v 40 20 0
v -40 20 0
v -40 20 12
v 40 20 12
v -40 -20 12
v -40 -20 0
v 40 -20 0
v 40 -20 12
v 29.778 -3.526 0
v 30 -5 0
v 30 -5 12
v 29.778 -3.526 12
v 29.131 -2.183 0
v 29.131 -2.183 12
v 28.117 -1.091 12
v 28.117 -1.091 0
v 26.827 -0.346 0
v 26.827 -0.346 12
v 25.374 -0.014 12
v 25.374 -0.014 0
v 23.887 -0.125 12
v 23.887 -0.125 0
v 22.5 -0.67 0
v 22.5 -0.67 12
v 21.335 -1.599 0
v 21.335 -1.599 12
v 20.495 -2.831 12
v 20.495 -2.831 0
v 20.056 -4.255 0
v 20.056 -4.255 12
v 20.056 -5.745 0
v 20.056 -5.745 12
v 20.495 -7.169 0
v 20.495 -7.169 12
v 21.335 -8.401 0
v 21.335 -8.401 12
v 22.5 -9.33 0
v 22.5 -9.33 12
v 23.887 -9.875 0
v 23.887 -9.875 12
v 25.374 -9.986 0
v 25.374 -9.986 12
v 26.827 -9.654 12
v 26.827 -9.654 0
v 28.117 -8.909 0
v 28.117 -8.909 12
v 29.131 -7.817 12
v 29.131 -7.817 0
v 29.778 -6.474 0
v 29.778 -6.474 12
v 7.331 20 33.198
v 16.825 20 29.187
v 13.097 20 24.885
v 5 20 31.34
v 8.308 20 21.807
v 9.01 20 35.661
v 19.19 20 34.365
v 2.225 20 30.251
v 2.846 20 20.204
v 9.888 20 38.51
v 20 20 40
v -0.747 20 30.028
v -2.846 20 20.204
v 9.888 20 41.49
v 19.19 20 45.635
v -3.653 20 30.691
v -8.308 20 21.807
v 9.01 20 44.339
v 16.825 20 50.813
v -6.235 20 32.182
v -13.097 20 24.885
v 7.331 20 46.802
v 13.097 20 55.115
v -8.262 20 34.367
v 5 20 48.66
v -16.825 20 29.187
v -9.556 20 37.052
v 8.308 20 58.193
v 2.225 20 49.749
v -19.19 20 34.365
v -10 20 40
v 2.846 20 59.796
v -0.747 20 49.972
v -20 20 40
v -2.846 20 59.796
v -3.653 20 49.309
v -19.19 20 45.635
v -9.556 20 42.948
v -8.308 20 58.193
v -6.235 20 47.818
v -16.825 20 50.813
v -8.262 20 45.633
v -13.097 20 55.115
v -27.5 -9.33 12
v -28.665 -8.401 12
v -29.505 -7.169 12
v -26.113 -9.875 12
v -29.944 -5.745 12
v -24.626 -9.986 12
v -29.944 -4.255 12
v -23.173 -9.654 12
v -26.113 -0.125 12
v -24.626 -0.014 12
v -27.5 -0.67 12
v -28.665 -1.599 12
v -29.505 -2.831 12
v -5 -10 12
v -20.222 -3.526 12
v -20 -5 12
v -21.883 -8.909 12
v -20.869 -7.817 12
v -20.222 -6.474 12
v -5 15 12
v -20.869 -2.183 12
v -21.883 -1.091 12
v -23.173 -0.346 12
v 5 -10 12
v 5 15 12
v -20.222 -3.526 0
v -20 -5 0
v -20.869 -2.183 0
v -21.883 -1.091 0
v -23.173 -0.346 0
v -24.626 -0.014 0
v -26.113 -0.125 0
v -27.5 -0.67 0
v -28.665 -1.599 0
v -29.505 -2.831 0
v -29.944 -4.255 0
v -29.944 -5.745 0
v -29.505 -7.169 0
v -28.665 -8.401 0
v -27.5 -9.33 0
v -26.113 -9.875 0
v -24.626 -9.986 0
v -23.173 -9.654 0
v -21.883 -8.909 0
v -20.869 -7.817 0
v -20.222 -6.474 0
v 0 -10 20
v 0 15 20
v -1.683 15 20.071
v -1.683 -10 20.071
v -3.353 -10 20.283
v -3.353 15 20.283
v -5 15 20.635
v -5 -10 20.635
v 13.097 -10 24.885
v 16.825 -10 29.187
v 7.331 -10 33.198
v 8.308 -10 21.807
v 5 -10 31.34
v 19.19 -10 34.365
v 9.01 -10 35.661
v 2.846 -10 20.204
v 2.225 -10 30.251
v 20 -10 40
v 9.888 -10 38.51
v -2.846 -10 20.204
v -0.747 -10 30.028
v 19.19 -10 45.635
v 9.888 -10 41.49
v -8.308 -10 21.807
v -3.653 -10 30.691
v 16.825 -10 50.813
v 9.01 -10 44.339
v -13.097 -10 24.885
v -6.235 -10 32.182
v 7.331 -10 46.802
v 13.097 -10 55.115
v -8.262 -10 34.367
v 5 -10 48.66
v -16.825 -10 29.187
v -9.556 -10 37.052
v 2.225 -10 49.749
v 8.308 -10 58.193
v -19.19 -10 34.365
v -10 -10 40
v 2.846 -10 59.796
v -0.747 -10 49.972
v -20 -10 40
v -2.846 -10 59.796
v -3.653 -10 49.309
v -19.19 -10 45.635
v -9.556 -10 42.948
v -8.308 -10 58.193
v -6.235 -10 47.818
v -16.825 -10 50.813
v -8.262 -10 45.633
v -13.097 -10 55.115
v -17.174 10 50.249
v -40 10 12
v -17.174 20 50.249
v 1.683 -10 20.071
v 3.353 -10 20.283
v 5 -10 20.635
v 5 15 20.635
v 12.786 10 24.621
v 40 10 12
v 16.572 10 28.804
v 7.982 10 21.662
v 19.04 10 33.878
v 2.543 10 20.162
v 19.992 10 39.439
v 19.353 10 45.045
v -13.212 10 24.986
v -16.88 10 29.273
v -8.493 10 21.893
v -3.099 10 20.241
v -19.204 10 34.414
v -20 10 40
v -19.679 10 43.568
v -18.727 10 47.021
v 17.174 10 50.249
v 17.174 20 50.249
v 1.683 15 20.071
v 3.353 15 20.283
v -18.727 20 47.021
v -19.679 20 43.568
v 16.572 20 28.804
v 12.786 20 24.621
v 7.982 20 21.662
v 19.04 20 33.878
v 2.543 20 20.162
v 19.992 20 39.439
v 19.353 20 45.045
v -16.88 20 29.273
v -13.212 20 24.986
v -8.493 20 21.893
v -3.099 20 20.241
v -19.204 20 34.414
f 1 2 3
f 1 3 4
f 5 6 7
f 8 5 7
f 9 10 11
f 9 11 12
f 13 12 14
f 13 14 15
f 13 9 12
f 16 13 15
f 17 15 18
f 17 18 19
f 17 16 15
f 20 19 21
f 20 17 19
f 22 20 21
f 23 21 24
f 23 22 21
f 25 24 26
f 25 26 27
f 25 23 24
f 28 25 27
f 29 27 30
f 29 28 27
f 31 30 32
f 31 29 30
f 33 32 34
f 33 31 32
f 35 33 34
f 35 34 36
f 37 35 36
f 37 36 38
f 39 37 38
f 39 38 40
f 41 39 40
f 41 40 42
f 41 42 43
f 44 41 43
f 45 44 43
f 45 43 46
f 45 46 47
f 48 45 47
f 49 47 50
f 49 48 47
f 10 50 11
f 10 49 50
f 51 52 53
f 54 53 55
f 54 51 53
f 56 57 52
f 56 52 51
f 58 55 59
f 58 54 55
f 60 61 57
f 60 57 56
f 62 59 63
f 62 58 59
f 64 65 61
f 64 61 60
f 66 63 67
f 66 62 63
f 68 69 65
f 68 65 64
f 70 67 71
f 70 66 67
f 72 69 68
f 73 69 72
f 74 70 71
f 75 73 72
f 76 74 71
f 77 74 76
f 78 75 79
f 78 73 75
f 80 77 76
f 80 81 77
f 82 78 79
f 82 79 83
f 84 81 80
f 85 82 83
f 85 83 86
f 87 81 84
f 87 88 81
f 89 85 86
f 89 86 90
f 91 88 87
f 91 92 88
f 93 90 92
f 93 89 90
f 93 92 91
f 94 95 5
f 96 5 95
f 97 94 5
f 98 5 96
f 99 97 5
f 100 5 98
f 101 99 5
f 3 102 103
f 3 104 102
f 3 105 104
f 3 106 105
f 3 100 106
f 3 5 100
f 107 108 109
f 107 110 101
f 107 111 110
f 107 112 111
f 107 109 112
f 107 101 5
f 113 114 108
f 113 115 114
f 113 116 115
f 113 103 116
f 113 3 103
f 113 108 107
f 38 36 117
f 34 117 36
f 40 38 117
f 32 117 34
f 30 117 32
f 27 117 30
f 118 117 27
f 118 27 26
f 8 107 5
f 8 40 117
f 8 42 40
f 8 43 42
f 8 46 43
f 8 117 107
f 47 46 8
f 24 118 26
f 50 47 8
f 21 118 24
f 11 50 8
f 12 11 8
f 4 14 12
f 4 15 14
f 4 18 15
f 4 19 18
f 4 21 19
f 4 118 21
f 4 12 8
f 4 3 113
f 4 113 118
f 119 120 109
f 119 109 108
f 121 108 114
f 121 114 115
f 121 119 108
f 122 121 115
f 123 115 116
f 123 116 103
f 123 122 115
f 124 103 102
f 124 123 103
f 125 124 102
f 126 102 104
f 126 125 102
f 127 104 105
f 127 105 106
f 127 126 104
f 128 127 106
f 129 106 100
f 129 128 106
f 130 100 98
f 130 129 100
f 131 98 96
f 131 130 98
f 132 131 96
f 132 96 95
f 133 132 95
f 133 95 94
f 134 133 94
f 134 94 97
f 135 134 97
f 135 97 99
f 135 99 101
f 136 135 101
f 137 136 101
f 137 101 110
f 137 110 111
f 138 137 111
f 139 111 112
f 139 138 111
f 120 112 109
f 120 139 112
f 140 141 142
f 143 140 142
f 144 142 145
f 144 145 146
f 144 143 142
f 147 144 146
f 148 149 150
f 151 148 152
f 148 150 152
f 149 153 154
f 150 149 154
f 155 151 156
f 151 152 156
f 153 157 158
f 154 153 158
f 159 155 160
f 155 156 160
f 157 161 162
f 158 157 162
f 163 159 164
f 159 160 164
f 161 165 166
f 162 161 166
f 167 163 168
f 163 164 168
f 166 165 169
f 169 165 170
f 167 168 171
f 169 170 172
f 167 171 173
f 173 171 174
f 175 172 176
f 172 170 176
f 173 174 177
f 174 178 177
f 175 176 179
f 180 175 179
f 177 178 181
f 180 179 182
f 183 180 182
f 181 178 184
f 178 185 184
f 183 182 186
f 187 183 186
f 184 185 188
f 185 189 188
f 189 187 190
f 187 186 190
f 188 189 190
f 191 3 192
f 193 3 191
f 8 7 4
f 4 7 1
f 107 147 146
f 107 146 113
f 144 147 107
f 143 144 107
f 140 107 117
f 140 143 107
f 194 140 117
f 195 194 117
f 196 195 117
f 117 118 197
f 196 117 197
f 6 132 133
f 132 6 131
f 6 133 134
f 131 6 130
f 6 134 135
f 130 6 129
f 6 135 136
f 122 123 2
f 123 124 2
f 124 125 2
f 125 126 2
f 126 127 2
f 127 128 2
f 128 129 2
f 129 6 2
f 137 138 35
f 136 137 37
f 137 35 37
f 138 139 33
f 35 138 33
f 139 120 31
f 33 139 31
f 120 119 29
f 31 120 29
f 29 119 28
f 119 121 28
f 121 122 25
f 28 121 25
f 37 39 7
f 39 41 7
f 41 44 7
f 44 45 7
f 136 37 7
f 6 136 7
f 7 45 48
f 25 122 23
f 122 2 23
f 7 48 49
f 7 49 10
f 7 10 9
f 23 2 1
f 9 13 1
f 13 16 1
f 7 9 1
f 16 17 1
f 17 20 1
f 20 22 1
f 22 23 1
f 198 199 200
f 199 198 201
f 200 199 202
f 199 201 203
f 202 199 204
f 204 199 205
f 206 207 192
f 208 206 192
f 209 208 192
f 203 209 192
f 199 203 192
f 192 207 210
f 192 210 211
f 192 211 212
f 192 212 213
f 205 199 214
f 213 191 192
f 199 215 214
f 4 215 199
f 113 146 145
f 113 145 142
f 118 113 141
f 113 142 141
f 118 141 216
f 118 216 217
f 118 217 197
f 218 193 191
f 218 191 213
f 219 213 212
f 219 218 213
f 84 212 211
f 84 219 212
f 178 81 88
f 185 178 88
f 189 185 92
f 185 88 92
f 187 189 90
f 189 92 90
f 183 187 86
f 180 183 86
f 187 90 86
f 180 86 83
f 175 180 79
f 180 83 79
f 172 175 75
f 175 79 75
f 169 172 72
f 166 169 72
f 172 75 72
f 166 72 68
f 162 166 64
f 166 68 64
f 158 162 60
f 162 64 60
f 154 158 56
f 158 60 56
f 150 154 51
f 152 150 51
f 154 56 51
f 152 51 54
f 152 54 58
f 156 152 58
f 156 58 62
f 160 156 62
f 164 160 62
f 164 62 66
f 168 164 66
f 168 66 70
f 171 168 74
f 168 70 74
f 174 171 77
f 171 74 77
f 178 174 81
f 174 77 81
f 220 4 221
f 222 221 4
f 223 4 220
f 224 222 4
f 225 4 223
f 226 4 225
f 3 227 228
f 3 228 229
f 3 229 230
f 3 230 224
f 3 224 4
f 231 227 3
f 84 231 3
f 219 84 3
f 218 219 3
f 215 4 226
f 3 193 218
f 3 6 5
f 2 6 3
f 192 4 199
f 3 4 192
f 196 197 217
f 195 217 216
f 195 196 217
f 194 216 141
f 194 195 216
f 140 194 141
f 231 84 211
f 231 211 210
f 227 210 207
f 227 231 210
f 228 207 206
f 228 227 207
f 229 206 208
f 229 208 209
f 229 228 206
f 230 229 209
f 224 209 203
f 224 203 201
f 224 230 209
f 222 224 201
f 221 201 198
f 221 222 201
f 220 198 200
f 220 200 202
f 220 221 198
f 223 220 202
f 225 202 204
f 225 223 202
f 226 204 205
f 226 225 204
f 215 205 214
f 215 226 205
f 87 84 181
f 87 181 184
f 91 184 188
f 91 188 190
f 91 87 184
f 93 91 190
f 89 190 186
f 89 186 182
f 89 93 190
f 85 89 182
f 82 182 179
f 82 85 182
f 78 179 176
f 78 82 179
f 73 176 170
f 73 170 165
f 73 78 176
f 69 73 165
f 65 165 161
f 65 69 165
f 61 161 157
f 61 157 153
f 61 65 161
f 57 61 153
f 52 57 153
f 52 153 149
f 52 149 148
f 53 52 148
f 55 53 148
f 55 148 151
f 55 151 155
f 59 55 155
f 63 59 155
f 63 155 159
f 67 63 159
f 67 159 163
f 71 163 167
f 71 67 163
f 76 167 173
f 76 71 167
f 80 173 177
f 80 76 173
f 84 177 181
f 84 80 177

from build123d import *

# Parameters (mm, degrees)
F0_W     = 80
F0_H     = 40
F0_R     = 5
F1_DEPTH = 12
F2_R     = 20
F2_R_2   = 10
F3_DEPTH = 30
F5_DEPTH = 10
F7_DEPTH = 25


with BuildPart() as f1:
    # F0 (on Top) → F1 (new body)
    with BuildSketch(Plane.XY):
        Rectangle(F0_W, F0_H)
        with Locations((-25, -5)):
            Circle(F0_R, mode=Mode.SUBTRACT)
        with Locations((25, -5)):
            Circle(F0_R, mode=Mode.SUBTRACT)
    extrude(amount=F1_DEPTH)

    # F6 (on face) → F7 (join)
    with BuildSketch(Plane.XZ.offset(10)):
        with BuildLine():
            Line((0, 12), (5, 12))
            Line((5, 12), (5, 20.635083269))
            ThreePointArc((5, 20.635083269), (2.5200858497, 20.1594060747), (0, 20))
            Line((0, 20), (0, 12))
        make_face()
        with BuildLine():
            Line((-5, 20.635083269), (-5, 12))
            Line((-5, 12), (0, 12))
            Line((0, 12), (0, 20))
            ThreePointArc((0, 20), (-2.5200858497, 20.1594060747), (-5, 20.635083269))
        make_face()
    extrude(amount=-F7_DEPTH)


with BuildPart() as f3:
    # F2 (on face) → F3 (new body)
    with BuildSketch(Plane(origin=(0, 20, 0), x_dir=(-1, 0, 0), z_dir=(0, 1, 0))):
        with Locations((0, 40)):
            Circle(F2_R)
        with Locations((0, 40)):
            Circle(F2_R_2, mode=Mode.SUBTRACT)
    extrude(amount=-F3_DEPTH)


with BuildPart() as f5:
    # F4 (on face) → F5 (new body)
    with BuildSketch(Plane(origin=(0, 20, 0), x_dir=(-1, 0, 0), z_dir=(0, 1, 0))):
        with BuildLine():
            Line((-17.1743221847, 50.2490320273), (-40, 12))
            Line((-40, 12), (40, 12))
            Line((40, 12), (17.1743222859, 50.2490318576))
            ThreePointArc((17.1743222859, 50.2490318576), (19.2806437356, 45.3157104079), (20, 40))
            ThreePointArc((20, 40), (-5.3157105031, 20.7193562906), (-17.1743221847, 50.2490320273))
        make_face()
    extrude(amount=-F5_DEPTH)


solid = Compound([f1.part, f3.part, f5.part])
